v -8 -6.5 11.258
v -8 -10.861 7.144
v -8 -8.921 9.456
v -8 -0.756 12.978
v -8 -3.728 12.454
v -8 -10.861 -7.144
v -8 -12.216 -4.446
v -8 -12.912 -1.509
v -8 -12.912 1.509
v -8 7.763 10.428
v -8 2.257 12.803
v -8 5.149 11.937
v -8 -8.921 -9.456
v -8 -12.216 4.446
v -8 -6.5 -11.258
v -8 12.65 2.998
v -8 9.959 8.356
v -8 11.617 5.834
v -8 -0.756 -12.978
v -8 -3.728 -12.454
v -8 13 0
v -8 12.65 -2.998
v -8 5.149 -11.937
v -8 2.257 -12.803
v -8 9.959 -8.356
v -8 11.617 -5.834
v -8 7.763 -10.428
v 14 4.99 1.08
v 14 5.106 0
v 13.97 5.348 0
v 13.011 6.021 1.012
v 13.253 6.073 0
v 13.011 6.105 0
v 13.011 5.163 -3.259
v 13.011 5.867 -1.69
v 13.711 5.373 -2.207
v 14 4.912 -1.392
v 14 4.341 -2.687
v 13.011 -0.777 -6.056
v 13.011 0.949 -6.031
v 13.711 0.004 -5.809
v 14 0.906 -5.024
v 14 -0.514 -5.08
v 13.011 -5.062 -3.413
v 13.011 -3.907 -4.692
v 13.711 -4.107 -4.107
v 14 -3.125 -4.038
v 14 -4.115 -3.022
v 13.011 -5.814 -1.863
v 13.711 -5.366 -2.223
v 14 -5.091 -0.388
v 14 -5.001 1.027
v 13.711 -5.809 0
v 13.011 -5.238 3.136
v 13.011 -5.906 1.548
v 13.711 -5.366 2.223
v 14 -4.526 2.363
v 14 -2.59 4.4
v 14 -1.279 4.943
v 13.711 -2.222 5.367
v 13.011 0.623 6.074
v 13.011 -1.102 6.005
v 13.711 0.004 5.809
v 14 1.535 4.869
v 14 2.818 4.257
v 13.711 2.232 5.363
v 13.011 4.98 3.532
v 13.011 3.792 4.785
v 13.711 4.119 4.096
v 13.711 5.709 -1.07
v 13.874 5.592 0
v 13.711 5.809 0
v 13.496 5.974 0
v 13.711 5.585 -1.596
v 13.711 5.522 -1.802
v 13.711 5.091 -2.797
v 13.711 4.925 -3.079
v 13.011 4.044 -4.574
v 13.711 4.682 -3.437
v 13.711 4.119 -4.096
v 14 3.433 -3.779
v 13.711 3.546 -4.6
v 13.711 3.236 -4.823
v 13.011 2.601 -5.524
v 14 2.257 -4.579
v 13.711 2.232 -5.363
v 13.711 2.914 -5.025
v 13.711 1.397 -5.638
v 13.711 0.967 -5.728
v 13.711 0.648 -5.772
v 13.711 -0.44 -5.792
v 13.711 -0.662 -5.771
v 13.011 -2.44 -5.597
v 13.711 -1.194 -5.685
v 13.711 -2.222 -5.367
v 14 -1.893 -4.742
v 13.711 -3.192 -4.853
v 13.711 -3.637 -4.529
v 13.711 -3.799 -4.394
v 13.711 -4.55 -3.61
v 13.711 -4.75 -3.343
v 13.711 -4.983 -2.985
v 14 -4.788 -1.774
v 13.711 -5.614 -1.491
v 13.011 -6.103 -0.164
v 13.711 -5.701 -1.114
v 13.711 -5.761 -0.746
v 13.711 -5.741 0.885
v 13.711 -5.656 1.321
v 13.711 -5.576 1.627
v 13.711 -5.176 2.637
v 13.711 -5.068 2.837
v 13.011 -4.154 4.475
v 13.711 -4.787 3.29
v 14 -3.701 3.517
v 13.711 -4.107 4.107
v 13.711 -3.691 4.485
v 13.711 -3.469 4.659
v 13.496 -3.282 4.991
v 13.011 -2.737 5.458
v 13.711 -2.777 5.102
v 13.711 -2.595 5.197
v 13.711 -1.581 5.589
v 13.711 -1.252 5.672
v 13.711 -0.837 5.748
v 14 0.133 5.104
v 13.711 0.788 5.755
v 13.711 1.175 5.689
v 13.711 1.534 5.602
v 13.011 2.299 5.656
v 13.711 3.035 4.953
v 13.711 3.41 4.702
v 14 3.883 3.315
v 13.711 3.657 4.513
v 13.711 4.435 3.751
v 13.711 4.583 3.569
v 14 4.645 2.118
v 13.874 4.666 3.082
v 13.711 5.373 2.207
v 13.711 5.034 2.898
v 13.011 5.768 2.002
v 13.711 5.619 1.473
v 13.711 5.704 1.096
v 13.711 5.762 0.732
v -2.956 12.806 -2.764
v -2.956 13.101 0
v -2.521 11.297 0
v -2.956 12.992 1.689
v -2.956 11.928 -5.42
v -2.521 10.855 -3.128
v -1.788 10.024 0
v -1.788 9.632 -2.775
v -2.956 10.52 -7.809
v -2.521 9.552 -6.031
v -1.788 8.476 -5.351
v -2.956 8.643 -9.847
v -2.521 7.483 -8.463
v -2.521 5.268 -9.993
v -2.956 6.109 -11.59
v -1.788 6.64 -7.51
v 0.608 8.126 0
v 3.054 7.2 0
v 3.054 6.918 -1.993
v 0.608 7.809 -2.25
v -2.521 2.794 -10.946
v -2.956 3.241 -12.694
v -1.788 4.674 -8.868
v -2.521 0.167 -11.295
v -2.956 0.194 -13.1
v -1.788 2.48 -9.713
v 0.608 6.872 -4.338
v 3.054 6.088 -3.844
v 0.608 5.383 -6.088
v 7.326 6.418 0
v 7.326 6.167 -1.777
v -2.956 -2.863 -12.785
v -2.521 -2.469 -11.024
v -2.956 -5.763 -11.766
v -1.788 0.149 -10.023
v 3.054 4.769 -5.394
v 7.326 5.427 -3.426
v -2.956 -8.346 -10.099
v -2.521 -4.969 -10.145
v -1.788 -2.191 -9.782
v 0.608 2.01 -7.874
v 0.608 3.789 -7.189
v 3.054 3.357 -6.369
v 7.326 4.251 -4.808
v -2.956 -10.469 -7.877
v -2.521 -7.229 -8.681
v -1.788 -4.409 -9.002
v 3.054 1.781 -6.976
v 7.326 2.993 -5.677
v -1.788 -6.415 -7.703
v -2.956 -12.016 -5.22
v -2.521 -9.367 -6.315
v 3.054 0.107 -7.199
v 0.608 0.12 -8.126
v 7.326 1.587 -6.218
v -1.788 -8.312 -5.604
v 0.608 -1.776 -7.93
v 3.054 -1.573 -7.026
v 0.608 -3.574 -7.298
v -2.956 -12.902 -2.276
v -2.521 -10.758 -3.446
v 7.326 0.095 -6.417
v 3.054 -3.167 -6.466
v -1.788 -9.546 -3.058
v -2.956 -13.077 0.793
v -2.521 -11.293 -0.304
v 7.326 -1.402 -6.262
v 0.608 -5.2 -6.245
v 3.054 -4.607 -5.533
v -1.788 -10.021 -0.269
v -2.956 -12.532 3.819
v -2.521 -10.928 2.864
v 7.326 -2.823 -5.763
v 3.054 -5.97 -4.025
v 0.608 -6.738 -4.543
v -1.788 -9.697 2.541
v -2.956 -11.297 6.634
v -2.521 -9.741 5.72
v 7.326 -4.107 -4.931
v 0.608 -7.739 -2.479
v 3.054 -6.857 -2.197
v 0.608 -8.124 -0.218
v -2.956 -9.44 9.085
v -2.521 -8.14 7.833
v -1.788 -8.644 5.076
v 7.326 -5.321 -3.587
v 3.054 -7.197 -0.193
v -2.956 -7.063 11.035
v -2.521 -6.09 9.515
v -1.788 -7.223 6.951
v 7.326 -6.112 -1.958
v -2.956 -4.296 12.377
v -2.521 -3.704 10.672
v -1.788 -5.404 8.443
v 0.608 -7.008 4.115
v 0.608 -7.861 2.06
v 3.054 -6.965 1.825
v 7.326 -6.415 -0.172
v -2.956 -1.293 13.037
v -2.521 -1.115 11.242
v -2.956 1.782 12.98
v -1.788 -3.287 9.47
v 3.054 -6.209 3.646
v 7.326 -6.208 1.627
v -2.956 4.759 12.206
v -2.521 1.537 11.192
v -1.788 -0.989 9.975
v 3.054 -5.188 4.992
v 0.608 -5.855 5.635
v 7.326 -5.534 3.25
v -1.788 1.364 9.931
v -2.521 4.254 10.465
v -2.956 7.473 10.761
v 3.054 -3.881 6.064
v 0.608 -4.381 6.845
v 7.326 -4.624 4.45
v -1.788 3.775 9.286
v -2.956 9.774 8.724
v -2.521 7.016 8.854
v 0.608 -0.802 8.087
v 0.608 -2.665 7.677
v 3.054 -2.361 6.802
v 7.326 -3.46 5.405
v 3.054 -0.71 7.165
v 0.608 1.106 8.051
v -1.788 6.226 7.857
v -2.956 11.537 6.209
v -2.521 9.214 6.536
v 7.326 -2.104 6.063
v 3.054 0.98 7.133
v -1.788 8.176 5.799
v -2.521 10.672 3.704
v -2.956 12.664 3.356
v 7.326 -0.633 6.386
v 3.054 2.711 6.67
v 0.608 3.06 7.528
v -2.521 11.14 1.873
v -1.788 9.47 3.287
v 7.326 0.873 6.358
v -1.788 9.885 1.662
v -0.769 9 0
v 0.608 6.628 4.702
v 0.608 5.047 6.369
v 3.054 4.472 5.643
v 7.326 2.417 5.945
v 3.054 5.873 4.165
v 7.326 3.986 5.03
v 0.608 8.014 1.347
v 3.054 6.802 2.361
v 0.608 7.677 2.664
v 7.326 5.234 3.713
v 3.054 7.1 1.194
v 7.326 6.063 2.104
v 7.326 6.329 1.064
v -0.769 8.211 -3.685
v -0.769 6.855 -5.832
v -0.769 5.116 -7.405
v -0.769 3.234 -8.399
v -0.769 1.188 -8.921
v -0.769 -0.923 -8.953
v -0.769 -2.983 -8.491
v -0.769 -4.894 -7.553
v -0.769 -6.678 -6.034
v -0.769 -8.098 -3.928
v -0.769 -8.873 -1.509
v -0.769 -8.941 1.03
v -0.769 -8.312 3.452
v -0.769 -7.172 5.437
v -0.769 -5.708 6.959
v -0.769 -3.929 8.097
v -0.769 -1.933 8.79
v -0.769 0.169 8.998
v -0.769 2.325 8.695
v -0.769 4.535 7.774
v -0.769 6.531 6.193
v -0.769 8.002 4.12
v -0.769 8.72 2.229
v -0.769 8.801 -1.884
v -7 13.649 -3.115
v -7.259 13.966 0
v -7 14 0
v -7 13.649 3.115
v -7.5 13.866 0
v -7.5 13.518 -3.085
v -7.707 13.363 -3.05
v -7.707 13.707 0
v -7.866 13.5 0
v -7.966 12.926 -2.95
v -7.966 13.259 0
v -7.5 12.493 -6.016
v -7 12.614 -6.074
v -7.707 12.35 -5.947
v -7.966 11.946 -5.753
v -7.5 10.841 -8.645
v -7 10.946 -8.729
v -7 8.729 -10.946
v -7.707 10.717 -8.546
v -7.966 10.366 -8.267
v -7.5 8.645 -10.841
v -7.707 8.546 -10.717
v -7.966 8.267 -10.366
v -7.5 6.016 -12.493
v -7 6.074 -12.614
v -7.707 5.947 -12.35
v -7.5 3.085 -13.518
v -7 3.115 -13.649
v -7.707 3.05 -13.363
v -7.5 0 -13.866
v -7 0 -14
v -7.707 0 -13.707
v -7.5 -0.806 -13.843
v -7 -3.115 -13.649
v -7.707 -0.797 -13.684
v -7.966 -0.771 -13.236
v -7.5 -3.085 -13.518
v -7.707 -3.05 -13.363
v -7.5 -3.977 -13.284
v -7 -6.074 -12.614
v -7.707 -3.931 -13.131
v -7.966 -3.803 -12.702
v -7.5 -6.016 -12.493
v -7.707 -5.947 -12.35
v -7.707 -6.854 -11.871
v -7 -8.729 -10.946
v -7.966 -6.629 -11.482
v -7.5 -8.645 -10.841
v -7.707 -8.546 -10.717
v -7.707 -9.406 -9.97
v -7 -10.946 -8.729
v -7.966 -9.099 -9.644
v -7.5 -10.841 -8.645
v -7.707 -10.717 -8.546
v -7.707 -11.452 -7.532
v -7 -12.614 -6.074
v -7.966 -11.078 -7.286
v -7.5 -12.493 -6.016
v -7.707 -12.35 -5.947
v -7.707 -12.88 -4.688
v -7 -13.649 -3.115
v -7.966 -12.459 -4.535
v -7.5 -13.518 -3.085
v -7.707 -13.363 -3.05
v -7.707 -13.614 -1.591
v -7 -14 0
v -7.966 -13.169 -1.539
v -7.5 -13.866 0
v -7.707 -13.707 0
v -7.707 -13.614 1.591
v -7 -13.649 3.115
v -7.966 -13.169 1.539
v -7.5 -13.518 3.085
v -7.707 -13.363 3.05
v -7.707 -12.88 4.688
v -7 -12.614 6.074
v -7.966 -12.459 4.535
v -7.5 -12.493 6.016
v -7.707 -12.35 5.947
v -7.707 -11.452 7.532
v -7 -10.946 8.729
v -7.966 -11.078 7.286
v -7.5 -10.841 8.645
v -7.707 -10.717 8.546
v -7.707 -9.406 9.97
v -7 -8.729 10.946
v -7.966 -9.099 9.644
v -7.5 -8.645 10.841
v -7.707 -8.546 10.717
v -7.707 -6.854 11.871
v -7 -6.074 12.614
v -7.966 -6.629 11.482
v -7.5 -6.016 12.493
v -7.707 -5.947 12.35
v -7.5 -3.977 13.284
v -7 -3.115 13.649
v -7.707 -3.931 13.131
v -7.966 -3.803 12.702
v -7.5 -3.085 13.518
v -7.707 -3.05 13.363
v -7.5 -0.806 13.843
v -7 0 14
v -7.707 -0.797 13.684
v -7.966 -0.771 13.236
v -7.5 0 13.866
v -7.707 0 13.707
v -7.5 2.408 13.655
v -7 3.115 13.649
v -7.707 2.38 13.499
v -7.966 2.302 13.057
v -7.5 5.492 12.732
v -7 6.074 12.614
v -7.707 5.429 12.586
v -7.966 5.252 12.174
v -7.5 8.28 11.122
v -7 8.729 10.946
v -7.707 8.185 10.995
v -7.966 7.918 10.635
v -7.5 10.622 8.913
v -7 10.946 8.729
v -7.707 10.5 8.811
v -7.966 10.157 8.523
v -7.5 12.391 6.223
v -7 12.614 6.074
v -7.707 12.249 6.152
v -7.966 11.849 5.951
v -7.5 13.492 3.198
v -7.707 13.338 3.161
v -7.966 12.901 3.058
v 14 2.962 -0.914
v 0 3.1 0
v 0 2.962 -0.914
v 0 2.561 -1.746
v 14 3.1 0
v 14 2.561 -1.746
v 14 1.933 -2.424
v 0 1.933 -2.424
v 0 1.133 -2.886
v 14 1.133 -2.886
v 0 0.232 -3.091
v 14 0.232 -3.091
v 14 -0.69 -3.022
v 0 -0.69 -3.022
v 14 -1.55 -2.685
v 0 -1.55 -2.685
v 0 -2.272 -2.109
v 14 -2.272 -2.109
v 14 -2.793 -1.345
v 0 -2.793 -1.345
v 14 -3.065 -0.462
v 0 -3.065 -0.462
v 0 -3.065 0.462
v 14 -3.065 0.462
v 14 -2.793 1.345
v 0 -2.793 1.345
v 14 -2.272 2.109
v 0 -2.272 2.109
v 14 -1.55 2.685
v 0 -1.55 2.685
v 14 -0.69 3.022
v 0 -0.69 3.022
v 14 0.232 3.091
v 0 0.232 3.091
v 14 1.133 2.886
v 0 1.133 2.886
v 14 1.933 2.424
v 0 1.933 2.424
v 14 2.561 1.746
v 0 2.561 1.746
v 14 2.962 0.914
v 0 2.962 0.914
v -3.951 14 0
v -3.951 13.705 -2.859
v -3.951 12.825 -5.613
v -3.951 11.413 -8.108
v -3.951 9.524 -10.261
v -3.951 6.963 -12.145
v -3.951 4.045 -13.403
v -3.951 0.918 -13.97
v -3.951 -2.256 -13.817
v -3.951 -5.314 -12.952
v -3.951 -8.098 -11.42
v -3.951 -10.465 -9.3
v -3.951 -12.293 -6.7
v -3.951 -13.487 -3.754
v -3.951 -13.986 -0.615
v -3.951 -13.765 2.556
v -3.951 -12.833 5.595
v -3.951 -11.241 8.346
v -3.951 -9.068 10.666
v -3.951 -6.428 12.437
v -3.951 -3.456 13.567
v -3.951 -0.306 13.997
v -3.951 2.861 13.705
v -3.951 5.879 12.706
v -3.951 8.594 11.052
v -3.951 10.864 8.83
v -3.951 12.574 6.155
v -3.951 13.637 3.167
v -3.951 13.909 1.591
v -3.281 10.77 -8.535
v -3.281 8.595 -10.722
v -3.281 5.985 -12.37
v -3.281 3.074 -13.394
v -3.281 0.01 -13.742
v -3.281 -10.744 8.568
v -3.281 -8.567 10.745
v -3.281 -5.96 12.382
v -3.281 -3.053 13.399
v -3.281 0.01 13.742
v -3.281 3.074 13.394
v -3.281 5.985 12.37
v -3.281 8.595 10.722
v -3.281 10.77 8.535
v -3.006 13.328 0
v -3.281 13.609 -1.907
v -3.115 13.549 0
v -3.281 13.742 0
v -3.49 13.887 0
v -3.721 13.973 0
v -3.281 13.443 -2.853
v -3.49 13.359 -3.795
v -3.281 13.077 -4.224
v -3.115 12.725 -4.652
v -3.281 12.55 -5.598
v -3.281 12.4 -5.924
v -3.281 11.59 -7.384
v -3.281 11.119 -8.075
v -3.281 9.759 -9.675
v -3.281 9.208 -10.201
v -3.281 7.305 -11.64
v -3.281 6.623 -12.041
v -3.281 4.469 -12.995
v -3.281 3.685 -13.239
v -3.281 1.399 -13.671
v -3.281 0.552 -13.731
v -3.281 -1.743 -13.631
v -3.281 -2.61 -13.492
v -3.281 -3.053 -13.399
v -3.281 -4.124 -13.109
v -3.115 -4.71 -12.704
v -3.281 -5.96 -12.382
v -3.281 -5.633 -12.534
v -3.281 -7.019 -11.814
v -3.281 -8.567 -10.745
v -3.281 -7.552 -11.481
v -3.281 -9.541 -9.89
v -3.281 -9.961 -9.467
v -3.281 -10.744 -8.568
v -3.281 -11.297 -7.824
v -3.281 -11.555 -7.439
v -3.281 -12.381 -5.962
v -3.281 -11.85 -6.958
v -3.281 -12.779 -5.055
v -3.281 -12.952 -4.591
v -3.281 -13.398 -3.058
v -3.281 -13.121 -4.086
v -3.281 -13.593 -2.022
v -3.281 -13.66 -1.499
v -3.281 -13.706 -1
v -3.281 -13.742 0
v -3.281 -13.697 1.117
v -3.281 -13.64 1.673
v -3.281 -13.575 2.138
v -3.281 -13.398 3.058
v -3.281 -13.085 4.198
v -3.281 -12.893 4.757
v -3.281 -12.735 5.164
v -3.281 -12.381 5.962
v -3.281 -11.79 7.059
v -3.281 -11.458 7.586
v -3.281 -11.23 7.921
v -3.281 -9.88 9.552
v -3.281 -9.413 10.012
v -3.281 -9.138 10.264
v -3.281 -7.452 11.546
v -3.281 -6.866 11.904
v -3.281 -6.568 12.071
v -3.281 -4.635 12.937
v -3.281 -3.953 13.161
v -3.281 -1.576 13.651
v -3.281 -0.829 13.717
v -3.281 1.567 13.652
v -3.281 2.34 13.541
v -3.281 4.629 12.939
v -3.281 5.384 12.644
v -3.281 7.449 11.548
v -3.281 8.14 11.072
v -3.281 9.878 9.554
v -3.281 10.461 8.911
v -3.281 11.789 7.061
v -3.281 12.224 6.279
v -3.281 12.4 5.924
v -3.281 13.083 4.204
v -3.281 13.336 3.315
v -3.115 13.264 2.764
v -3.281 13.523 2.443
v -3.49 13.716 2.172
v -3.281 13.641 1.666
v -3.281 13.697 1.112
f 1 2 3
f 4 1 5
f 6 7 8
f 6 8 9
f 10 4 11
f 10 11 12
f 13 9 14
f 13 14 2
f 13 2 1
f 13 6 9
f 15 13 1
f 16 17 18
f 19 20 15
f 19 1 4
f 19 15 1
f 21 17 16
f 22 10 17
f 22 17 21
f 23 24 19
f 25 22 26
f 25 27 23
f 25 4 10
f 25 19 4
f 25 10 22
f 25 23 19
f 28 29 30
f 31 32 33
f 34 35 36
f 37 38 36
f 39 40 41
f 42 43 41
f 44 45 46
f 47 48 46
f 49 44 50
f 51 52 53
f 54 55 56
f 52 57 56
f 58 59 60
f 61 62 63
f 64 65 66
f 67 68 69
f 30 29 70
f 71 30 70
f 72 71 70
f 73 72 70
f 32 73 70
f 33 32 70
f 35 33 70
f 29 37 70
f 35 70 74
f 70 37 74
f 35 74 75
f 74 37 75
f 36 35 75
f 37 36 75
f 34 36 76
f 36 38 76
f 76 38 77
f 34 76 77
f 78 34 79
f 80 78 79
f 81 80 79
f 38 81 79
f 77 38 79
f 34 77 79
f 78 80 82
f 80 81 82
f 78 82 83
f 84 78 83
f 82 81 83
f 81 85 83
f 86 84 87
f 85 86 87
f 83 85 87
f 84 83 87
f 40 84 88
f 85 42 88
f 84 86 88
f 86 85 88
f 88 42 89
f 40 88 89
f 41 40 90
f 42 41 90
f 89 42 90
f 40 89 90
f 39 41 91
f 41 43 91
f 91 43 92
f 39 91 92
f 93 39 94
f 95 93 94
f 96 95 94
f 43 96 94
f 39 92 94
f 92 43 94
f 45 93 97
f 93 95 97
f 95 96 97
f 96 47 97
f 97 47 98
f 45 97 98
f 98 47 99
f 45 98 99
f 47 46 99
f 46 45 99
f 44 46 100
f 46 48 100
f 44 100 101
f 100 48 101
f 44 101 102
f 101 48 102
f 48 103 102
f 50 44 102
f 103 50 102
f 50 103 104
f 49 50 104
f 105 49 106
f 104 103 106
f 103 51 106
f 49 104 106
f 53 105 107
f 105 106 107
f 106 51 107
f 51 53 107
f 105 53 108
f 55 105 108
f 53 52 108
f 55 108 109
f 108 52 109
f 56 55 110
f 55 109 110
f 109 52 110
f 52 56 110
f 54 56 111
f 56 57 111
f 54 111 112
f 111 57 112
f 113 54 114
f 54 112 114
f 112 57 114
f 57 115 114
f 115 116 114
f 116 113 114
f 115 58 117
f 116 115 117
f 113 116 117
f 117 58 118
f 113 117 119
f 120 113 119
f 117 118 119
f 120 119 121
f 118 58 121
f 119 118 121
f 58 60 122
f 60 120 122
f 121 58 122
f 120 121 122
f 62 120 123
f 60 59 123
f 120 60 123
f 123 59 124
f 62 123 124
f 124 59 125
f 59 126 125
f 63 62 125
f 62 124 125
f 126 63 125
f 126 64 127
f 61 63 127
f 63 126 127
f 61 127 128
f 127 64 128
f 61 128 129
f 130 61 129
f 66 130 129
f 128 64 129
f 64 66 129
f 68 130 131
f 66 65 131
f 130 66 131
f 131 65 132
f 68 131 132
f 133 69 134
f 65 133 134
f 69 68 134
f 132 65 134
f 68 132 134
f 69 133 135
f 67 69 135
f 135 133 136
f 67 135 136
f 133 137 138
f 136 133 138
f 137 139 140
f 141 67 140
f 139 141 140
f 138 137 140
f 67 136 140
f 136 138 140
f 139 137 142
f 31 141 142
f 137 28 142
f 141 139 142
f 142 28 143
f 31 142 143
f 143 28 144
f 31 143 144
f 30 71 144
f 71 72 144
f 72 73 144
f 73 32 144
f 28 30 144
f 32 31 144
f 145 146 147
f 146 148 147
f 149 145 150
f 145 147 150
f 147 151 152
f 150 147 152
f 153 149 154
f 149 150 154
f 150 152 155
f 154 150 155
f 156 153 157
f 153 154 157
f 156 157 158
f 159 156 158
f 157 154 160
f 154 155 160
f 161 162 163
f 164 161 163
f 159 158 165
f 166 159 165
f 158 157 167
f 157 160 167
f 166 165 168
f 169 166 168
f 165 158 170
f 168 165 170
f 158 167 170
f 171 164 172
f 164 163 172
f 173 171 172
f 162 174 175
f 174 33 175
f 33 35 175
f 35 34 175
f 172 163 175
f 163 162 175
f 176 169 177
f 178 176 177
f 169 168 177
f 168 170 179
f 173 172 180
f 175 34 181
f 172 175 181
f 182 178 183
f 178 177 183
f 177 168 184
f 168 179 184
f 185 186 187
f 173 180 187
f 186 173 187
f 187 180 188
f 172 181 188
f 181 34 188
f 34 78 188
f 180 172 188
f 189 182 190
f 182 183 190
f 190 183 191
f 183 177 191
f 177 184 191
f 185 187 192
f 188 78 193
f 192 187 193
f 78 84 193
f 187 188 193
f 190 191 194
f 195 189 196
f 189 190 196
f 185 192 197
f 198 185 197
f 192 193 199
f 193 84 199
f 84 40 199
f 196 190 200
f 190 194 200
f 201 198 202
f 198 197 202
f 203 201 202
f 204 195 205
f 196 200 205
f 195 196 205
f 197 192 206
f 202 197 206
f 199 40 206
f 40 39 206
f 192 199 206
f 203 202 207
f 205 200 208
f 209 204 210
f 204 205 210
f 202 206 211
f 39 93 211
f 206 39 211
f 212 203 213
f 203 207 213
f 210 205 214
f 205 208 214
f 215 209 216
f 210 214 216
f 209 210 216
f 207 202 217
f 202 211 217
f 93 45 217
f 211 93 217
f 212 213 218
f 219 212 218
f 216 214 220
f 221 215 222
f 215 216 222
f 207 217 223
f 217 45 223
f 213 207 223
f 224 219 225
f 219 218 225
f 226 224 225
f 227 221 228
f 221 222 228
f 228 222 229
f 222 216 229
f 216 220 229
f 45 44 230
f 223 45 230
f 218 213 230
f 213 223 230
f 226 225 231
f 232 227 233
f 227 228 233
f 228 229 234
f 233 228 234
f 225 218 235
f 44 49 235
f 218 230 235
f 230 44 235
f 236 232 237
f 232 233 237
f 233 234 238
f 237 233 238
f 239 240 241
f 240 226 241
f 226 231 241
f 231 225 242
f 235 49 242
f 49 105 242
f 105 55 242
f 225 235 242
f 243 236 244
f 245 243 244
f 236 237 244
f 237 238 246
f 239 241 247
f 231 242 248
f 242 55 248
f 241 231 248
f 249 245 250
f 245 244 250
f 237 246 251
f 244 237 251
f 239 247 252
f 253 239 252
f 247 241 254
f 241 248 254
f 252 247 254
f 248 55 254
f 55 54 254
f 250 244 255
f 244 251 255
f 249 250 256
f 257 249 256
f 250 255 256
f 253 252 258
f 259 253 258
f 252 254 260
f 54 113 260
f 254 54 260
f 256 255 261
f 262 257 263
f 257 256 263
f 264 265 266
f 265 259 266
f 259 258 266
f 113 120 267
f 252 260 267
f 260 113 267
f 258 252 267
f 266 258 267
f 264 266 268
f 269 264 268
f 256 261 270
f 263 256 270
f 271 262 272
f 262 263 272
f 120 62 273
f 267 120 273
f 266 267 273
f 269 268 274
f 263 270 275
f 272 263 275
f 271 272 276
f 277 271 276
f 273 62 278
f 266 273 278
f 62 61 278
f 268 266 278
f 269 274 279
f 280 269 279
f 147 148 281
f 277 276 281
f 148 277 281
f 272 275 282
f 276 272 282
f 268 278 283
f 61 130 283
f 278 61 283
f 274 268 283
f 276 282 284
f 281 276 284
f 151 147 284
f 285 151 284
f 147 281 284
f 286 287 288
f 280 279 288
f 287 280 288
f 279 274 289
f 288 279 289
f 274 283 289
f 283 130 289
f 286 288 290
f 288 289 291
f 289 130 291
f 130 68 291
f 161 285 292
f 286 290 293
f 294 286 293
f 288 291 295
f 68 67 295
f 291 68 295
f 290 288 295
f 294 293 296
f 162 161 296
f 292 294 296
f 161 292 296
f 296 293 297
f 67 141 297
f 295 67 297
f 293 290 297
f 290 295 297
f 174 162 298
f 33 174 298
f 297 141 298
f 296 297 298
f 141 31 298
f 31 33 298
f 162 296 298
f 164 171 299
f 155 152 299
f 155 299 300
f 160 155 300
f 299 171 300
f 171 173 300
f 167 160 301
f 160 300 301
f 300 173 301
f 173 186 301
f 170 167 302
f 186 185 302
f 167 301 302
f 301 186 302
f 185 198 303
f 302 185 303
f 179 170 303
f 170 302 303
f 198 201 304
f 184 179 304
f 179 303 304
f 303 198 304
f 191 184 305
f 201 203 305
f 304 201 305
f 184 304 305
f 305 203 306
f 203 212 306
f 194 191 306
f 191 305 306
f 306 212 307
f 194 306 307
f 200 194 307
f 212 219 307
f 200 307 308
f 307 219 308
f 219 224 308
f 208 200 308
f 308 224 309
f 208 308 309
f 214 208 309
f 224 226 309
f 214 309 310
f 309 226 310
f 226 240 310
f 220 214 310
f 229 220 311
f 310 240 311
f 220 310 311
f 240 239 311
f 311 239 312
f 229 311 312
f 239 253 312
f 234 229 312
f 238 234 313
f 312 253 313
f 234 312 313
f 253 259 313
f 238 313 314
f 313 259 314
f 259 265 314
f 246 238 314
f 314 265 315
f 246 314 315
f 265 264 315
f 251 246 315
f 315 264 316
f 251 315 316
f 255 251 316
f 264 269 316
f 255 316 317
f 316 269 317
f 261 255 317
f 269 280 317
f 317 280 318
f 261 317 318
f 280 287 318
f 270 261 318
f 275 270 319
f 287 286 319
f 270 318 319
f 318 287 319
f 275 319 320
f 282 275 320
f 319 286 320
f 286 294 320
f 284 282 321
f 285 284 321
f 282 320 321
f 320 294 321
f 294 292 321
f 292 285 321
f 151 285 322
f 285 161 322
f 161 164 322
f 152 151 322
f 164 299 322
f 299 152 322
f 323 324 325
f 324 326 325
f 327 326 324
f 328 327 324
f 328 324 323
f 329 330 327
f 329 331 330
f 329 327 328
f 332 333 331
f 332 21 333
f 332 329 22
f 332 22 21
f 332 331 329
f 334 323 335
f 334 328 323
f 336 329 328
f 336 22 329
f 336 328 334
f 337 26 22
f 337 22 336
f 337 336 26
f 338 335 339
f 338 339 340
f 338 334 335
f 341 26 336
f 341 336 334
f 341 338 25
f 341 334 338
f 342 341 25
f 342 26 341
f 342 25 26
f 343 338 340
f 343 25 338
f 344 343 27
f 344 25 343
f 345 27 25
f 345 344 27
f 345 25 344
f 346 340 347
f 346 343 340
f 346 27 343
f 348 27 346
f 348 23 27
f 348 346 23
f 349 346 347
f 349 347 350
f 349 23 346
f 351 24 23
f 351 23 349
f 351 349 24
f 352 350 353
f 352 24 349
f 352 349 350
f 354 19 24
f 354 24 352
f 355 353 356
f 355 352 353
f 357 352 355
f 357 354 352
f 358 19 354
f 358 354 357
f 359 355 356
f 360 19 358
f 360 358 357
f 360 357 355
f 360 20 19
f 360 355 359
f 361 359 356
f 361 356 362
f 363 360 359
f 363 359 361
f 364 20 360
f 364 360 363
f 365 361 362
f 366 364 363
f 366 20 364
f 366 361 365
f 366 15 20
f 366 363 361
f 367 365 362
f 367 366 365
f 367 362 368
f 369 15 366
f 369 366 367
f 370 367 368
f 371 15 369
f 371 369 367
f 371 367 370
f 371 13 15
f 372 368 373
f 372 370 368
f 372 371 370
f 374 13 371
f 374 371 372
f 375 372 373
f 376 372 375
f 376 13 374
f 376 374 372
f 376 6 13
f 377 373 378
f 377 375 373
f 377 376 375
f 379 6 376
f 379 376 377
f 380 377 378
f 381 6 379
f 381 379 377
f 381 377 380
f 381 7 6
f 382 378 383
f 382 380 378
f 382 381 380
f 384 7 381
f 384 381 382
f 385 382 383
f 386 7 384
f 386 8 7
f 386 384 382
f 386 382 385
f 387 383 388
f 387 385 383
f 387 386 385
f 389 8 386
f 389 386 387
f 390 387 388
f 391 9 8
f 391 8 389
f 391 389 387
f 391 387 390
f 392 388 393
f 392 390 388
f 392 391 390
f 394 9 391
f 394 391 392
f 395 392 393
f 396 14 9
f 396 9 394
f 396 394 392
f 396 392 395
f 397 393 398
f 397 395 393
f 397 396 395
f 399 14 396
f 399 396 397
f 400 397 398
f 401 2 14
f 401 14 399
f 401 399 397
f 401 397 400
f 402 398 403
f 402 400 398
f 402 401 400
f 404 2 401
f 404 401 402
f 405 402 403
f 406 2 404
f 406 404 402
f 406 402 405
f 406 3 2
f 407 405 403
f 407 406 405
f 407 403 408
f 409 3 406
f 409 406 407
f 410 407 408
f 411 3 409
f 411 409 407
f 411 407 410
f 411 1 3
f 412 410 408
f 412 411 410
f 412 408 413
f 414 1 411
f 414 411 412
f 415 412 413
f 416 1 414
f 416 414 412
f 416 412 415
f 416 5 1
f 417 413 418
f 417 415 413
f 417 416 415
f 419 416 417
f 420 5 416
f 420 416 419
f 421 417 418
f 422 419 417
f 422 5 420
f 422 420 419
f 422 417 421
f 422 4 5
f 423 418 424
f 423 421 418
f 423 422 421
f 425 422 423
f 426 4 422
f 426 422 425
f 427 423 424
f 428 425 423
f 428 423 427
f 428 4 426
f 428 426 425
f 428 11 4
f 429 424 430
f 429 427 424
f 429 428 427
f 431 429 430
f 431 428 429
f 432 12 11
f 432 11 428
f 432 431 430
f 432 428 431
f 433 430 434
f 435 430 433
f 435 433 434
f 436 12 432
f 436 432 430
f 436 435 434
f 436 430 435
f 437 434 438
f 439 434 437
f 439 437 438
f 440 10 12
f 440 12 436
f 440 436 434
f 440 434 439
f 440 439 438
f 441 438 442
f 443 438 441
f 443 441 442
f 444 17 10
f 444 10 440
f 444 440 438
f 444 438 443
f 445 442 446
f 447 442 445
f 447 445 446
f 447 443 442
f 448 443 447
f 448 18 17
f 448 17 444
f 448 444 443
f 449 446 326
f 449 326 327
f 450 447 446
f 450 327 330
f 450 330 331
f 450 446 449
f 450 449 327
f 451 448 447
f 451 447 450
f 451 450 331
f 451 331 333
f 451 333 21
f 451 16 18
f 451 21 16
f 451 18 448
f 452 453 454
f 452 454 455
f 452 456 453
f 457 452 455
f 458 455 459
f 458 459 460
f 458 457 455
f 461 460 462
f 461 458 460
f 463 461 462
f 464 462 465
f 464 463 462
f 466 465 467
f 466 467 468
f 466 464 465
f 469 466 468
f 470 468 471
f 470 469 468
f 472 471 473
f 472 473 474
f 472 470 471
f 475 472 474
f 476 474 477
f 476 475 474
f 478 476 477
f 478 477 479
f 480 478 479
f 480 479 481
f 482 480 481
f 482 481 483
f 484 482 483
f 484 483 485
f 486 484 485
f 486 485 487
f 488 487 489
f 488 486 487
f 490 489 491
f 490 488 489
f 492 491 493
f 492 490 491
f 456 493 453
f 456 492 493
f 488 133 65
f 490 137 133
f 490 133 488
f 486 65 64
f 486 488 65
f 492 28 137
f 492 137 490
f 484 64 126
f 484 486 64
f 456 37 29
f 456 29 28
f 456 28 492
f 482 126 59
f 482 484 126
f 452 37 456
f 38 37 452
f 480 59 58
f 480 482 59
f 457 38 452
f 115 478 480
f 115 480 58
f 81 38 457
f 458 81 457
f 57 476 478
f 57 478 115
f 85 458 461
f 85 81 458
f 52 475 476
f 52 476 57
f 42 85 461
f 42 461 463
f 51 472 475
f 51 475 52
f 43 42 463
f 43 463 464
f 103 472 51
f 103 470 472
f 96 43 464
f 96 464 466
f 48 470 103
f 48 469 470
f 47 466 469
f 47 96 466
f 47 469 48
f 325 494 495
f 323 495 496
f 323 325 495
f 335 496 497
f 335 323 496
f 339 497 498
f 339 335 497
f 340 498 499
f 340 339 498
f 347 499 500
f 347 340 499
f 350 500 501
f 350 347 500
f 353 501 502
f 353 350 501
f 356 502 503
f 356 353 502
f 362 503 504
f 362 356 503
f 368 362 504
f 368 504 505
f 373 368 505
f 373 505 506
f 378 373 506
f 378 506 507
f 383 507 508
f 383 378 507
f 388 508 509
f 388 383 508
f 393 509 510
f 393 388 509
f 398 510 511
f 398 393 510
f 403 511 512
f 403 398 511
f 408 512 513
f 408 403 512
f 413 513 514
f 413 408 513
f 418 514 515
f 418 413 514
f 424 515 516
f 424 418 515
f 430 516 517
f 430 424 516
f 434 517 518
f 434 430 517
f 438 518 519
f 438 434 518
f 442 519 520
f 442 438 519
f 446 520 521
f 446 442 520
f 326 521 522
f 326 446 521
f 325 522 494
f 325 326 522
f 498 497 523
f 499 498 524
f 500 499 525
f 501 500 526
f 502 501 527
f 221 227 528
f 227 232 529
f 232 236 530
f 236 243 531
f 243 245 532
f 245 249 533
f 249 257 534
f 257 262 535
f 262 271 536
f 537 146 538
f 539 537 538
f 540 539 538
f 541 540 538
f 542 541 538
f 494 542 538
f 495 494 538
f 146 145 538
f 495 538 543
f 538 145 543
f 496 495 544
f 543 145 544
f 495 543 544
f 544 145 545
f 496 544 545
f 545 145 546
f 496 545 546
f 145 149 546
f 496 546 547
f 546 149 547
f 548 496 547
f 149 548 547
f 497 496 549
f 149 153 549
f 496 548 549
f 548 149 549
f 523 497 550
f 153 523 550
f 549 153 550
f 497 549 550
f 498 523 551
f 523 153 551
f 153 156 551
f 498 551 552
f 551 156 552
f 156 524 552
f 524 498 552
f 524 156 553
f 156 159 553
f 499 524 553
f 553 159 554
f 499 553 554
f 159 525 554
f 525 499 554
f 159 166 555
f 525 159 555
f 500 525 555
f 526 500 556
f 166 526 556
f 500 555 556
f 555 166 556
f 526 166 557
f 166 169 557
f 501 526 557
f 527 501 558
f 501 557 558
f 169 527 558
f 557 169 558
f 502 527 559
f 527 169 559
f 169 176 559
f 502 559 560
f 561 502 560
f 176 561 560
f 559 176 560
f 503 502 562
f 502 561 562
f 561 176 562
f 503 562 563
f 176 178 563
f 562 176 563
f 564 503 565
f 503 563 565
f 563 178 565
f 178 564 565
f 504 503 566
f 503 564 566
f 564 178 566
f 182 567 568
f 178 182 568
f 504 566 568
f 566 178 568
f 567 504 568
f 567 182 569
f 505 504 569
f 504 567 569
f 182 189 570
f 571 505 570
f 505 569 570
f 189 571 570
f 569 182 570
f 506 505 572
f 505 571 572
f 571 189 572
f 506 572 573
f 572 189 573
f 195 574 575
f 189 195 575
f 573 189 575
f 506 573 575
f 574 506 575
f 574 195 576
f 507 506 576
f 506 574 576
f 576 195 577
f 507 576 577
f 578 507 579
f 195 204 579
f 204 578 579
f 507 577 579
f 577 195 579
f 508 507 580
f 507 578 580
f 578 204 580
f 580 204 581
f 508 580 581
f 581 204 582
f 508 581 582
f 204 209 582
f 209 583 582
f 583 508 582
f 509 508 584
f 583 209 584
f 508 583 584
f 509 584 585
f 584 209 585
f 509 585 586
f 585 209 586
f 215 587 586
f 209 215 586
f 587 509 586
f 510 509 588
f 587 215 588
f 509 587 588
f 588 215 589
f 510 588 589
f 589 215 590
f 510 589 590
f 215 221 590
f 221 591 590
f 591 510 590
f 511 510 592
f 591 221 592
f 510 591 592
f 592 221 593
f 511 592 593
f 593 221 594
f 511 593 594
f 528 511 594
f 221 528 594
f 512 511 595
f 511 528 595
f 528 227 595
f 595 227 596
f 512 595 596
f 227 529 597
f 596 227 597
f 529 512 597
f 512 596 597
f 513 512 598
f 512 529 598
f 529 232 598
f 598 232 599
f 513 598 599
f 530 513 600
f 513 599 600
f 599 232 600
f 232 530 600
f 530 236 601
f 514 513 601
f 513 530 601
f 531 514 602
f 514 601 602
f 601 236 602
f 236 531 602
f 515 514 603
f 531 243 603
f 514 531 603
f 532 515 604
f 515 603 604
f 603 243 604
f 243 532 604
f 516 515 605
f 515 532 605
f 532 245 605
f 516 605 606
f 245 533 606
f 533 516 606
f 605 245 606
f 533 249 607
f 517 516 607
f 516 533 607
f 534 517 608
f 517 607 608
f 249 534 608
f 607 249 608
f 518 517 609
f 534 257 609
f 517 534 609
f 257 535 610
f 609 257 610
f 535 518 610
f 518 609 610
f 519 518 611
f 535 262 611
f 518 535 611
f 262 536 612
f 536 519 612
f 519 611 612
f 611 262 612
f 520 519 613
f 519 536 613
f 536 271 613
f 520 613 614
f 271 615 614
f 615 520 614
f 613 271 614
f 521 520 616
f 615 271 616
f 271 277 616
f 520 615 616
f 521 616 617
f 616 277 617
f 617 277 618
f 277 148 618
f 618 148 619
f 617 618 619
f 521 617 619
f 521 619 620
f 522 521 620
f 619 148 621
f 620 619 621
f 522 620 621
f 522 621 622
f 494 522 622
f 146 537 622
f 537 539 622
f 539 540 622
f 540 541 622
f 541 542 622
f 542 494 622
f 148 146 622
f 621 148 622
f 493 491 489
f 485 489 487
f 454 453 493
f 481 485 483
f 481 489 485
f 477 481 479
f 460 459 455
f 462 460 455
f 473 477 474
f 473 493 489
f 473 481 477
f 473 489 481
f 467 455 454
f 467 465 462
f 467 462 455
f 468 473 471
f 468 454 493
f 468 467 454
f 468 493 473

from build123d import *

# Parameters (mm, degrees)
FILLET1_R = 1


with BuildPart() as part:
    # Sketch1 → Revolve1 (revolve)
    with BuildSketch(Plane.XY):
        with BuildLine():
            Line((0, 0), (0, 3.1))
            Line((0, 3.1), (14, 3.1))
            Line((14, 3.1), (14, 6.1))
            add(Edge.make_bspline(
                [(-3, 14), (-3, 8.867369014), (0.961422575, 6.1), (14, 6.1)],
                knots=[0, 0, 0, 0, 1, 1, 1, 1], degree=3))
            Line((-3, 14), (-8, 14))
            Line((-8, 14), (-8, 0))
            Line((-8, 0), (0, 0))
        make_face()
    revolve(axis=Axis((0, 0, 0), (-1, 0, 0)))

    # Fillet1
    fillet1_edges = [part.edges().sort_by_distance(p)[0] for p in [
        (14, -6.1, 0),
        (-3, -14, 0),
        (-8, -14, 0),
    ]]
    fillet(fillet1_edges, radius=FILLET1_R)


solid = part.part
